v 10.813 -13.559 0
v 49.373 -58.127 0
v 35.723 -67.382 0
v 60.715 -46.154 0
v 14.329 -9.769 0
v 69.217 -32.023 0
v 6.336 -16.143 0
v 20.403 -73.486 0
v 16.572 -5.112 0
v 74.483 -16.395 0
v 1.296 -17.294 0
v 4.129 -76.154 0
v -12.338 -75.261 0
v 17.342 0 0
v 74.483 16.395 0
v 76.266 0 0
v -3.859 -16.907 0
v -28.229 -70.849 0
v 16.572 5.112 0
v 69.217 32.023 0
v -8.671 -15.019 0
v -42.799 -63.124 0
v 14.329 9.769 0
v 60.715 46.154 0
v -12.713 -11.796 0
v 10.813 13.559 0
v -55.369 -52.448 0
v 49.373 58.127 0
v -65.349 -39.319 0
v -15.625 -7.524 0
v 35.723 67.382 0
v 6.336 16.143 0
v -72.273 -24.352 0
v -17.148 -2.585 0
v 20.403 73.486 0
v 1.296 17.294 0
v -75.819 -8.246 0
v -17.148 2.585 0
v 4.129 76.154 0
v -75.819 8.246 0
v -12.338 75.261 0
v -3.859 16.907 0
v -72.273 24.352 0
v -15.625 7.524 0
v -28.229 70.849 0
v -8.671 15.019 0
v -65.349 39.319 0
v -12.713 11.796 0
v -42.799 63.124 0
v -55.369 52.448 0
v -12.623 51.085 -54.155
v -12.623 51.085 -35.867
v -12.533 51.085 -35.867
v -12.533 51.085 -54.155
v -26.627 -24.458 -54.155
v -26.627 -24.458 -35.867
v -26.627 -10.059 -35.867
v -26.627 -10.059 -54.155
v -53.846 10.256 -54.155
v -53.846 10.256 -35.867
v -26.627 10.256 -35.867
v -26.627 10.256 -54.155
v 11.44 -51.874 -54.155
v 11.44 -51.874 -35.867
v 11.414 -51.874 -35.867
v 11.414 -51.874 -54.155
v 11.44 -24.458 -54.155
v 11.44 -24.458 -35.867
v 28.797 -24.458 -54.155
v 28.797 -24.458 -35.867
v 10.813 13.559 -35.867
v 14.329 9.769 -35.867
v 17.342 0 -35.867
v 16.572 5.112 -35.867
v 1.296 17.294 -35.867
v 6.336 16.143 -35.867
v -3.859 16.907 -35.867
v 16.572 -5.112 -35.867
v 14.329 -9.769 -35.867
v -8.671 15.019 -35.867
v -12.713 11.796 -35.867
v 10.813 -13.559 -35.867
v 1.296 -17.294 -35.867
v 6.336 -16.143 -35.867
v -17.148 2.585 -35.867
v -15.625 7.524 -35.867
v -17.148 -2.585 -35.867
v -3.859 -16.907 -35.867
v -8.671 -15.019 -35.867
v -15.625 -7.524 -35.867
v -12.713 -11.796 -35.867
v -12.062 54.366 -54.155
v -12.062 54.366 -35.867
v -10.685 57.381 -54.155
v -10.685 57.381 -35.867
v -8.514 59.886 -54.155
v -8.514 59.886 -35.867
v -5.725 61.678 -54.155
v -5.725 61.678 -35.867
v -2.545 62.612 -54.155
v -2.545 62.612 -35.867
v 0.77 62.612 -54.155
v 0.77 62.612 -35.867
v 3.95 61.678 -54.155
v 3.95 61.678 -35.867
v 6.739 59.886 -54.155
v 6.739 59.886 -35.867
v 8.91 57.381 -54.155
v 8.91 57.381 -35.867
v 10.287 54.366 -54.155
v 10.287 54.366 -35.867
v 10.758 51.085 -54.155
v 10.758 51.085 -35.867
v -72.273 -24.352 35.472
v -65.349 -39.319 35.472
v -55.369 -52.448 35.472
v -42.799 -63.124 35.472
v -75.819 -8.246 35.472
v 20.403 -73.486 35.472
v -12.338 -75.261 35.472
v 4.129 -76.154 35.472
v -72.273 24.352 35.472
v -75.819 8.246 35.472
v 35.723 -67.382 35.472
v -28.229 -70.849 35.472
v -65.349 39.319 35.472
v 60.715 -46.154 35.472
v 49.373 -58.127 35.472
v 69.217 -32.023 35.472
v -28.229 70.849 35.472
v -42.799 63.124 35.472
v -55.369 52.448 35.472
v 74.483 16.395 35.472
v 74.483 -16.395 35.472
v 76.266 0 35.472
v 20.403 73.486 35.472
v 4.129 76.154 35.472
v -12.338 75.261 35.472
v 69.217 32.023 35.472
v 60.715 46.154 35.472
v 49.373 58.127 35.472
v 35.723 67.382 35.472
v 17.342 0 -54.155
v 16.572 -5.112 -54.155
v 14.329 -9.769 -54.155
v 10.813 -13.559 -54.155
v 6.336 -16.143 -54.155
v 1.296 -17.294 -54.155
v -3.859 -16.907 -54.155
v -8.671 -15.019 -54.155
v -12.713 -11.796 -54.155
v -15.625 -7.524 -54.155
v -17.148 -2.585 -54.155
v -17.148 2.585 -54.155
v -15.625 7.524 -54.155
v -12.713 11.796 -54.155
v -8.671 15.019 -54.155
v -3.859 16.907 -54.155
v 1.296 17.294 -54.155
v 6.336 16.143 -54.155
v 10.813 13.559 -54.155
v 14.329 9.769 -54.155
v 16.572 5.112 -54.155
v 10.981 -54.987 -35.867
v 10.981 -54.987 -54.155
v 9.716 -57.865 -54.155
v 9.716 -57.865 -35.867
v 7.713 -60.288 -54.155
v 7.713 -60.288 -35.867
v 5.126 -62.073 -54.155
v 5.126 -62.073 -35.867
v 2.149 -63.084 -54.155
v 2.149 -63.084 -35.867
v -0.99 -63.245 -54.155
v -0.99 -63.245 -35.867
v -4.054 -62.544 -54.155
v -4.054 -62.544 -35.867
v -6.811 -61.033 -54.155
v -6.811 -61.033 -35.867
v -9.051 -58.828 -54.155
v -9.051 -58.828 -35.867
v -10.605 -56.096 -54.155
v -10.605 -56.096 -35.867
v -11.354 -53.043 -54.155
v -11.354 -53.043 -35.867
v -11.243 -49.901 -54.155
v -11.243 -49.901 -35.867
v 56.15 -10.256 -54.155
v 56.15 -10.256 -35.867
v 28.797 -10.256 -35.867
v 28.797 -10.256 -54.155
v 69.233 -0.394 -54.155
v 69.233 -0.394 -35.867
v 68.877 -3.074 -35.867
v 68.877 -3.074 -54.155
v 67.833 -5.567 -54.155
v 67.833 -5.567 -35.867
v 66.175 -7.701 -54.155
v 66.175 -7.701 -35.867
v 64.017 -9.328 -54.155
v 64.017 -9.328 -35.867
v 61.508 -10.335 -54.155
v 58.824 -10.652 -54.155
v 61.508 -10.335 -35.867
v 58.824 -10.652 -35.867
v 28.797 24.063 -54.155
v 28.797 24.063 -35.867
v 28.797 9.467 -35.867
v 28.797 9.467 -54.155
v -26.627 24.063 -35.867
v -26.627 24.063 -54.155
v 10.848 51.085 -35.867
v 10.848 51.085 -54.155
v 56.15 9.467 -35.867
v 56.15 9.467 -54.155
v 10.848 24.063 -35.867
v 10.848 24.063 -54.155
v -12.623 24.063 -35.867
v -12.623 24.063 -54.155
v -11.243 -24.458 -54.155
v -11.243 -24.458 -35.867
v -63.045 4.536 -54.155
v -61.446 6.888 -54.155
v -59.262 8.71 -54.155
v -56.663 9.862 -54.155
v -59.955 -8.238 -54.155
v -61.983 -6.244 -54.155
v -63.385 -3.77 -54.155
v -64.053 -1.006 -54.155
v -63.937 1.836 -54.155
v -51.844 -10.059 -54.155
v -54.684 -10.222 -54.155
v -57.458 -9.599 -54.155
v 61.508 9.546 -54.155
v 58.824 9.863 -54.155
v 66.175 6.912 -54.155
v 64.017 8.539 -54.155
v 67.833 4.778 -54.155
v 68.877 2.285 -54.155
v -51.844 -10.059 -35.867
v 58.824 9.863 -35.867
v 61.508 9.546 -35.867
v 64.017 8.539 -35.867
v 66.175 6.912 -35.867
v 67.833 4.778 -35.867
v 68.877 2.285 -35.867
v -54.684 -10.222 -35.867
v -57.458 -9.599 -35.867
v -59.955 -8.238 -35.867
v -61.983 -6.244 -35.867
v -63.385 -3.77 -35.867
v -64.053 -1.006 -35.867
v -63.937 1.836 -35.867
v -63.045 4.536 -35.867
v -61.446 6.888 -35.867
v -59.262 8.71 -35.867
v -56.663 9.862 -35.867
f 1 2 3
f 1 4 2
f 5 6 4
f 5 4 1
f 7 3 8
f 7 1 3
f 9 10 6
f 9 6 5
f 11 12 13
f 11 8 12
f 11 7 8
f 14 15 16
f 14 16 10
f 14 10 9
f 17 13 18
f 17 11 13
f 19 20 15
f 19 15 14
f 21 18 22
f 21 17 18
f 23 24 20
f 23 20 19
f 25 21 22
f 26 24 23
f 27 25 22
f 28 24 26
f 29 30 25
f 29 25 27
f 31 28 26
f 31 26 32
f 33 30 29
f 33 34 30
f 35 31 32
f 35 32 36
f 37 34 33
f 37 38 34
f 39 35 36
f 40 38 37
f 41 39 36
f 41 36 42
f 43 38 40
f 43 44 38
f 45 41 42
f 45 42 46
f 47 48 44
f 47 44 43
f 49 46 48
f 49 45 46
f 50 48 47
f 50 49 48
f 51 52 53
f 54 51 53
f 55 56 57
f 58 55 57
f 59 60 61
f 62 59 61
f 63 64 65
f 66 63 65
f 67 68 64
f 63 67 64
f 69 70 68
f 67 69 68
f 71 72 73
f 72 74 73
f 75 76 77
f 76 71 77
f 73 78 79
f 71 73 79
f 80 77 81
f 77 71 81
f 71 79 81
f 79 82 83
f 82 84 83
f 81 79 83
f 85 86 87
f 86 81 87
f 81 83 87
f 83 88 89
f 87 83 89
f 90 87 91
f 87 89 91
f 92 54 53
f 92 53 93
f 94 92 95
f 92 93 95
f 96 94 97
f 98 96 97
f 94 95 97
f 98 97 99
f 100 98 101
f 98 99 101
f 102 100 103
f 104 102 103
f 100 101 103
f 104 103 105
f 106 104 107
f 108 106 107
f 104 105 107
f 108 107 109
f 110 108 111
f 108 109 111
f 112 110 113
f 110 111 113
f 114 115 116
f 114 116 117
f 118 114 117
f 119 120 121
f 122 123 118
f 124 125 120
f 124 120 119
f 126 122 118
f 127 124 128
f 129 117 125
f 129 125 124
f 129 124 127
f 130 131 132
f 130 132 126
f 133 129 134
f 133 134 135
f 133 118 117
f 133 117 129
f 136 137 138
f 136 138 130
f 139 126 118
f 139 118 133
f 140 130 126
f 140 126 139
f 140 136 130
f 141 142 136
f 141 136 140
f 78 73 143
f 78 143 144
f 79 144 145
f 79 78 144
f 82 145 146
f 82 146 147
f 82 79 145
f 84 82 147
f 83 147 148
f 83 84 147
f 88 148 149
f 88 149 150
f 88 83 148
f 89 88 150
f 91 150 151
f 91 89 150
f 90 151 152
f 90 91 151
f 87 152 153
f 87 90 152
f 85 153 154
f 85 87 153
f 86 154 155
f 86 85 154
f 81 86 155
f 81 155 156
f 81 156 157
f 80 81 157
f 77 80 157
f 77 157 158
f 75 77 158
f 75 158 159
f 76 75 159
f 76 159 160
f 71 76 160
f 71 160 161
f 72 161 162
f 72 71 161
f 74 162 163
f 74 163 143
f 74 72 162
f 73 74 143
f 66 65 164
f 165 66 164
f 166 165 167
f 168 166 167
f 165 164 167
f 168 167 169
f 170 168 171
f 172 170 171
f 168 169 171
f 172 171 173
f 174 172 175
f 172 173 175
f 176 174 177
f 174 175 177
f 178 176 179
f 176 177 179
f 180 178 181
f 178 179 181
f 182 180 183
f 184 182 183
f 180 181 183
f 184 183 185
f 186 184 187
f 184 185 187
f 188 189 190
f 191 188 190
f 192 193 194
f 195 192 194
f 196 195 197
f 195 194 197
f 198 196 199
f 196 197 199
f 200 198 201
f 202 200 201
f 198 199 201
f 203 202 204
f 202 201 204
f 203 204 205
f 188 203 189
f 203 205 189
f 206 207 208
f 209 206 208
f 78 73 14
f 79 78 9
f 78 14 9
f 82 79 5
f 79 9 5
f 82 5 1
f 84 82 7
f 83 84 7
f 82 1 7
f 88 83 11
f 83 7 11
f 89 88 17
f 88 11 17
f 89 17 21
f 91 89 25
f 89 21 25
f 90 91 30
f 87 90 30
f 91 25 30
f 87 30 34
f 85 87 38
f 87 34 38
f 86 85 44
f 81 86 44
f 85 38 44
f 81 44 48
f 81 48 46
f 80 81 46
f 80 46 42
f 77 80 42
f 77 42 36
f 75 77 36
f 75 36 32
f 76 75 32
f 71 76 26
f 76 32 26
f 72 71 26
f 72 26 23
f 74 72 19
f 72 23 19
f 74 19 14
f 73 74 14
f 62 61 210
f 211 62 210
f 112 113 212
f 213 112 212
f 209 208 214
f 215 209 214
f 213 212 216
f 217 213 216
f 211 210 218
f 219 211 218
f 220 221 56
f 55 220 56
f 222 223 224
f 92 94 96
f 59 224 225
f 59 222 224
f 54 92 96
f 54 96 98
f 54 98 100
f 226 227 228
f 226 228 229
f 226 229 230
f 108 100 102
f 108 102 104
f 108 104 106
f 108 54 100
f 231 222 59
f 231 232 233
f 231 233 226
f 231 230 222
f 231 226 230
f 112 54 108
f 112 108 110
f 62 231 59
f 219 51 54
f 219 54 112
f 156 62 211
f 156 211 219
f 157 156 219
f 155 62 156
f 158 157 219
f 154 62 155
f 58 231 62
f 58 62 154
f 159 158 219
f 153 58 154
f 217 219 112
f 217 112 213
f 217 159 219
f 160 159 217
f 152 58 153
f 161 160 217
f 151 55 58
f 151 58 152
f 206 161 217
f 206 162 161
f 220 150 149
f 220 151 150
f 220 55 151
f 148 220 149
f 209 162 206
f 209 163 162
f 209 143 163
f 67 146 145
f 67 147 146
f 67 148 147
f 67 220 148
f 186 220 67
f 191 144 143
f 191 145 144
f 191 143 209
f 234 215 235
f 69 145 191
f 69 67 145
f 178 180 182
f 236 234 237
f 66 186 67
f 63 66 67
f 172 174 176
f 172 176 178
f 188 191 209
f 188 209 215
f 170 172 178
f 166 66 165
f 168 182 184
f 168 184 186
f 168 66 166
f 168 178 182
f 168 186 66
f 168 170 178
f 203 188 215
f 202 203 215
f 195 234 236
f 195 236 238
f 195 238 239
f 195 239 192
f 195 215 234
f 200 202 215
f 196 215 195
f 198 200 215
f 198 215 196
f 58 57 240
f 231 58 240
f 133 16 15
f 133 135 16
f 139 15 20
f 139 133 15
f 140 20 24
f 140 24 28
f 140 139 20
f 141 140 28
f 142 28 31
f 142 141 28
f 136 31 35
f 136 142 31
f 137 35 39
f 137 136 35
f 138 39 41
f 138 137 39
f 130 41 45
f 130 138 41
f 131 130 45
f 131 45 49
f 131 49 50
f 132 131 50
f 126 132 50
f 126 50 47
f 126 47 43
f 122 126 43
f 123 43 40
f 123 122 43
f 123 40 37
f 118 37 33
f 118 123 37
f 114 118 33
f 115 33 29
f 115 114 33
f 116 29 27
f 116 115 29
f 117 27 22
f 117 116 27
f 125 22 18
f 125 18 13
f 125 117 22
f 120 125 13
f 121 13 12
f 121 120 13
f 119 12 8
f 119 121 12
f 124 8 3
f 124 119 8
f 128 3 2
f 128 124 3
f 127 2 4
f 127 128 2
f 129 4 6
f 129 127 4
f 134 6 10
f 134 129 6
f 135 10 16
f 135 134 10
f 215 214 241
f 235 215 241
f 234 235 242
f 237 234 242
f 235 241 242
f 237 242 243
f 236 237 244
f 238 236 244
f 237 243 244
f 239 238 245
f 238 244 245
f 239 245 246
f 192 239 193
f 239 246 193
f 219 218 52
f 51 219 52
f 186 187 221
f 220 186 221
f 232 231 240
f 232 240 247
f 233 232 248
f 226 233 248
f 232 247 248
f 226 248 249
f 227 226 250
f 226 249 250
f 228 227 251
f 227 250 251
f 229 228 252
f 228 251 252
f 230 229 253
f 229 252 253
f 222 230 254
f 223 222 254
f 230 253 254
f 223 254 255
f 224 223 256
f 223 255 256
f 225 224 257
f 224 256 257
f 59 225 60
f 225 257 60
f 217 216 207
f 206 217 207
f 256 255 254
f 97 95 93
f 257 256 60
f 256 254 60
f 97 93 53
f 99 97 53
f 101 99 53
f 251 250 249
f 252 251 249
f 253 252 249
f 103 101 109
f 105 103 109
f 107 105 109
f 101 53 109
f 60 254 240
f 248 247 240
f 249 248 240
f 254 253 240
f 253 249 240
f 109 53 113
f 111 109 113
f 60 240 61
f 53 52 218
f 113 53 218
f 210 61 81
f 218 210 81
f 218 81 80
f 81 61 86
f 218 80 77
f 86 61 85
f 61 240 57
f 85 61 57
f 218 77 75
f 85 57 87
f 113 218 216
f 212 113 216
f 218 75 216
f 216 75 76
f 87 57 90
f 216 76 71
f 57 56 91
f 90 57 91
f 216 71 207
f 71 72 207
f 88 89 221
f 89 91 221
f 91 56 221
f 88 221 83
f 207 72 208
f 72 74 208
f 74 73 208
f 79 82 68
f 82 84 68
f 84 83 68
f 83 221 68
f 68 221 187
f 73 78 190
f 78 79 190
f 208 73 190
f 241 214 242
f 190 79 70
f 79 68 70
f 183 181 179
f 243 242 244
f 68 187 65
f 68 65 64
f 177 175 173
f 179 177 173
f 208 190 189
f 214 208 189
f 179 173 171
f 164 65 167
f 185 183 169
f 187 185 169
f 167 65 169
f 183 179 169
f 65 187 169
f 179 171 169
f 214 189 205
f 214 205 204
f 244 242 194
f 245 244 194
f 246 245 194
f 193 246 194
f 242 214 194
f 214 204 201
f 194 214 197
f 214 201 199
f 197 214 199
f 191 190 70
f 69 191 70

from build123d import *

# Parameters (mm, degrees)
F2_W     = 17.3420682549
F2_H     = 35.8665511012
F4_R     = 17.3420682549
F5_DEPTH = 18.288


# Not quite as in the source:
# - the program builds the solid bodies; features that only make, move or delete a surface that nothing else refers to are left out


with BuildPart() as f1:
    # F0 (on Front) → F1 (revolve)
    with BuildSketch(Plane.XZ):
        with BuildLine():
            Line((0, 0), (35.2114337626, 0))
            ThreePointArc((35.2114337626, 0), (24.8982435888, 24.8982435888), (0, 35.2114337626))
            Line((0, 35.2114337626), (0, 0))
        make_face()
        with BuildLine():
            ThreePointArc((0, 35.2114337626), (24.8982435888, 24.8982435888), (35.2114337626, 0))
            Line((35.2114337626, 0), (76.2656927109, 0))
            Line((76.2656927109, 0), (76.2656927109, 35.4724153876))
            Line((76.2656927109, 35.4724153876), (0, 35.4724153876))
            Line((0, 35.4724153876), (0, 35.2114337626))
        make_face()
    revolve(axis=Axis((0, 0, 17.7362076938), (0, 0, 1)))

    # F2 (on Front) → F3 (revolve)
    with BuildSketch(Plane.XZ):
        with Locations((8.6710341275, -17.9332755506)):
            Rectangle(F2_W, F2_H)
    revolve(axis=Axis((0, 0, -17.9332755506), (0, 0, -1)))


with BuildPart() as f5:
    # F4 (on face) → F5 (new body)
    with BuildSketch(Plane(origin=(0, 0, -35.8665511012), x_dir=(1, 0, 0), z_dir=(0, 0, -1))):
        with BuildLine():
            Line((56.1504008339, 10.256420821), (28.7968739867, 10.256420821))
            Line((28.7968739867, 10.256420821), (28.7968739867, -9.467465803))
            Line((28.7968739867, -9.467465803), (56.1504008339, -9.467465803))
            ThreePointArc((56.1504008339, -9.467465803), (48.7161076265, 0.394477509), (56.1504008339, 10.256420821))
        make_face()
        Polygon((28.7968739867, 10.256420821), (28.7968739867, 24.4576204568), (11.4398542792, 24.4576204568), (-11.242615059, 24.4576204568), (-26.6272462904, 24.4576204568), (-26.6272462904, 10.0591816008), (-26.6272462904, -10.256420821), (-26.6272462904, -24.0631420165), (-12.623286806, -24.0631420165), (10.8481375501, -24.0631420165), (28.7968739867, -24.0631420165), (28.7968739867, -9.467465803), align=None)
        Circle(F4_R, mode=Mode.SUBTRACT)
        with BuildLine():
            Line((10.8481375501, -51.0848648846), (10.8481375501, -24.0631420165))
            Line((10.8481375501, -24.0631420165), (-12.623286806, -24.0631420165))
            Line((-12.623286806, -24.0631420165), (-12.623286806, -51.0848648846))
            Line((-12.623286806, -51.0848648846), (-12.5334393836, -51.0848648846))
            ThreePointArc((-12.5334393836, -51.0848648846), (-0.887574628, -39.4390001291), (10.7582901276, -51.0848648846))
            Line((10.7582901276, -51.0848648846), (10.8481375501, -51.0848648846))
        make_face()
        with BuildLine():
            Line((-26.6272462904, -10.256420821), (-26.6272462904, 10.0591816008))
            Line((-26.6272462904, 10.0591816008), (-51.8444488937, 10.0591816008))
            ThreePointArc((-51.8444488937, 10.0591816008), (-45.9176178455, 6.5062777185), (-43.5897856951, 0))
            ThreePointArc((-43.5897856951, 0), (-46.5938218028, -7.2523847132), (-53.846206516, -10.256420821))
            Line((-53.846206516, -10.256420821), (-26.6272462904, -10.256420821))
        make_face()
        with BuildLine():
            Line((-11.242615059, 24.4576204568), (11.4398542792, 24.4576204568))
            Line((11.4398542792, 24.4576204568), (11.4398542792, 51.8738217652))
            Line((11.4398542792, 51.8738217652), (11.4143216161, 51.8738217652))
            ThreePointArc((11.4143216161, 51.8738217652), (0.9899277412, 40.502507812), (-11.242615059, 49.9014261179))
            Line((-11.242615059, 49.9014261179), (-11.242615059, 24.4576204568))
        make_face()
        with BuildLine():
            ThreePointArc((69.2327374024, 0.394477509), (65.1495063475, 8.5860197322), (56.1504008339, 10.256420821))
            Line((56.1504008339, 10.256420821), (58.9744225144, 10.256420821))
            Line((58.9744225144, 10.256420821), (58.9744225144, -9.467465803))
            Line((58.9744225144, -9.467465803), (56.1504008339, -9.467465803))
            ThreePointArc((56.1504008339, -9.467465803), (65.1495063475, -7.7970647143), (69.2327374024, 0.394477509))
        make_face()
        with BuildLine():
            ThreePointArc((-12.5334393836, -51.0848648846), (-0.887574628, -62.7307296402), (10.7582901276, -51.0848648846))
            Line((10.7582901276, -51.0848648846), (-12.5334393836, -51.0848648846))
        make_face()
        with BuildLine():
            Line((-53.846206516, 10.0591816008), (-51.8444488937, 10.0591816008))
            ThreePointArc((-51.8444488937, 10.0591816008), (-64.0531984252, 1.0057257191), (-53.846206516, -10.256420821))
            Line((-53.846206516, -10.256420821), (-53.846206516, 10.0591816008))
        make_face()
        with BuildLine():
            Line((-12.5334393836, -51.0848648846), (10.7582901276, -51.0848648846))
            ThreePointArc((10.7582901276, -51.0848648846), (-0.887574628, -39.4390001291), (-12.5334393836, -51.0848648846))
        make_face()
        with BuildLine():
            Line((58.9744225144, 10.256420821), (56.1504008339, 10.256420821))
            ThreePointArc((56.1504008339, 10.256420821), (48.7161076265, 0.394477509), (56.1504008339, -9.467465803))
            Line((56.1504008339, -9.467465803), (58.9744225144, -9.467465803))
            Line((58.9744225144, -9.467465803), (58.9744225144, 10.256420821))
        make_face()
        with BuildLine():
            Line((-11.242615059, 51.8738217652), (-11.242615059, 49.9014261179))
            ThreePointArc((-11.242615059, 49.9014261179), (0.9899277412, 40.502507812), (11.4143216161, 51.8738217652))
            Line((11.4143216161, 51.8738217652), (-11.242615059, 51.8738217652))
        make_face()
        with BuildLine():
            ThreePointArc((11.4143216161, 51.8738217652), (-0.9899277412, 63.2451357184), (-11.242615059, 49.9014261179))
            Line((-11.242615059, 49.9014261179), (-11.242615059, 51.8738217652))
            Line((-11.242615059, 51.8738217652), (11.4143216161, 51.8738217652))
        make_face()
        with BuildLine():
            ThreePointArc((-43.5897856951, 0), (-45.9176178455, 6.5062777185), (-51.8444488937, 10.0591816008))
            Line((-51.8444488937, 10.0591816008), (-53.846206516, 10.0591816008))
            Line((-53.846206516, 10.0591816008), (-53.846206516, -10.256420821))
            ThreePointArc((-53.846206516, -10.256420821), (-46.5938218028, -7.2523847132), (-43.5897856951, 0))
        make_face()
    extrude(amount=F5_DEPTH)


solid = Compound([f1.part, f5.part])
